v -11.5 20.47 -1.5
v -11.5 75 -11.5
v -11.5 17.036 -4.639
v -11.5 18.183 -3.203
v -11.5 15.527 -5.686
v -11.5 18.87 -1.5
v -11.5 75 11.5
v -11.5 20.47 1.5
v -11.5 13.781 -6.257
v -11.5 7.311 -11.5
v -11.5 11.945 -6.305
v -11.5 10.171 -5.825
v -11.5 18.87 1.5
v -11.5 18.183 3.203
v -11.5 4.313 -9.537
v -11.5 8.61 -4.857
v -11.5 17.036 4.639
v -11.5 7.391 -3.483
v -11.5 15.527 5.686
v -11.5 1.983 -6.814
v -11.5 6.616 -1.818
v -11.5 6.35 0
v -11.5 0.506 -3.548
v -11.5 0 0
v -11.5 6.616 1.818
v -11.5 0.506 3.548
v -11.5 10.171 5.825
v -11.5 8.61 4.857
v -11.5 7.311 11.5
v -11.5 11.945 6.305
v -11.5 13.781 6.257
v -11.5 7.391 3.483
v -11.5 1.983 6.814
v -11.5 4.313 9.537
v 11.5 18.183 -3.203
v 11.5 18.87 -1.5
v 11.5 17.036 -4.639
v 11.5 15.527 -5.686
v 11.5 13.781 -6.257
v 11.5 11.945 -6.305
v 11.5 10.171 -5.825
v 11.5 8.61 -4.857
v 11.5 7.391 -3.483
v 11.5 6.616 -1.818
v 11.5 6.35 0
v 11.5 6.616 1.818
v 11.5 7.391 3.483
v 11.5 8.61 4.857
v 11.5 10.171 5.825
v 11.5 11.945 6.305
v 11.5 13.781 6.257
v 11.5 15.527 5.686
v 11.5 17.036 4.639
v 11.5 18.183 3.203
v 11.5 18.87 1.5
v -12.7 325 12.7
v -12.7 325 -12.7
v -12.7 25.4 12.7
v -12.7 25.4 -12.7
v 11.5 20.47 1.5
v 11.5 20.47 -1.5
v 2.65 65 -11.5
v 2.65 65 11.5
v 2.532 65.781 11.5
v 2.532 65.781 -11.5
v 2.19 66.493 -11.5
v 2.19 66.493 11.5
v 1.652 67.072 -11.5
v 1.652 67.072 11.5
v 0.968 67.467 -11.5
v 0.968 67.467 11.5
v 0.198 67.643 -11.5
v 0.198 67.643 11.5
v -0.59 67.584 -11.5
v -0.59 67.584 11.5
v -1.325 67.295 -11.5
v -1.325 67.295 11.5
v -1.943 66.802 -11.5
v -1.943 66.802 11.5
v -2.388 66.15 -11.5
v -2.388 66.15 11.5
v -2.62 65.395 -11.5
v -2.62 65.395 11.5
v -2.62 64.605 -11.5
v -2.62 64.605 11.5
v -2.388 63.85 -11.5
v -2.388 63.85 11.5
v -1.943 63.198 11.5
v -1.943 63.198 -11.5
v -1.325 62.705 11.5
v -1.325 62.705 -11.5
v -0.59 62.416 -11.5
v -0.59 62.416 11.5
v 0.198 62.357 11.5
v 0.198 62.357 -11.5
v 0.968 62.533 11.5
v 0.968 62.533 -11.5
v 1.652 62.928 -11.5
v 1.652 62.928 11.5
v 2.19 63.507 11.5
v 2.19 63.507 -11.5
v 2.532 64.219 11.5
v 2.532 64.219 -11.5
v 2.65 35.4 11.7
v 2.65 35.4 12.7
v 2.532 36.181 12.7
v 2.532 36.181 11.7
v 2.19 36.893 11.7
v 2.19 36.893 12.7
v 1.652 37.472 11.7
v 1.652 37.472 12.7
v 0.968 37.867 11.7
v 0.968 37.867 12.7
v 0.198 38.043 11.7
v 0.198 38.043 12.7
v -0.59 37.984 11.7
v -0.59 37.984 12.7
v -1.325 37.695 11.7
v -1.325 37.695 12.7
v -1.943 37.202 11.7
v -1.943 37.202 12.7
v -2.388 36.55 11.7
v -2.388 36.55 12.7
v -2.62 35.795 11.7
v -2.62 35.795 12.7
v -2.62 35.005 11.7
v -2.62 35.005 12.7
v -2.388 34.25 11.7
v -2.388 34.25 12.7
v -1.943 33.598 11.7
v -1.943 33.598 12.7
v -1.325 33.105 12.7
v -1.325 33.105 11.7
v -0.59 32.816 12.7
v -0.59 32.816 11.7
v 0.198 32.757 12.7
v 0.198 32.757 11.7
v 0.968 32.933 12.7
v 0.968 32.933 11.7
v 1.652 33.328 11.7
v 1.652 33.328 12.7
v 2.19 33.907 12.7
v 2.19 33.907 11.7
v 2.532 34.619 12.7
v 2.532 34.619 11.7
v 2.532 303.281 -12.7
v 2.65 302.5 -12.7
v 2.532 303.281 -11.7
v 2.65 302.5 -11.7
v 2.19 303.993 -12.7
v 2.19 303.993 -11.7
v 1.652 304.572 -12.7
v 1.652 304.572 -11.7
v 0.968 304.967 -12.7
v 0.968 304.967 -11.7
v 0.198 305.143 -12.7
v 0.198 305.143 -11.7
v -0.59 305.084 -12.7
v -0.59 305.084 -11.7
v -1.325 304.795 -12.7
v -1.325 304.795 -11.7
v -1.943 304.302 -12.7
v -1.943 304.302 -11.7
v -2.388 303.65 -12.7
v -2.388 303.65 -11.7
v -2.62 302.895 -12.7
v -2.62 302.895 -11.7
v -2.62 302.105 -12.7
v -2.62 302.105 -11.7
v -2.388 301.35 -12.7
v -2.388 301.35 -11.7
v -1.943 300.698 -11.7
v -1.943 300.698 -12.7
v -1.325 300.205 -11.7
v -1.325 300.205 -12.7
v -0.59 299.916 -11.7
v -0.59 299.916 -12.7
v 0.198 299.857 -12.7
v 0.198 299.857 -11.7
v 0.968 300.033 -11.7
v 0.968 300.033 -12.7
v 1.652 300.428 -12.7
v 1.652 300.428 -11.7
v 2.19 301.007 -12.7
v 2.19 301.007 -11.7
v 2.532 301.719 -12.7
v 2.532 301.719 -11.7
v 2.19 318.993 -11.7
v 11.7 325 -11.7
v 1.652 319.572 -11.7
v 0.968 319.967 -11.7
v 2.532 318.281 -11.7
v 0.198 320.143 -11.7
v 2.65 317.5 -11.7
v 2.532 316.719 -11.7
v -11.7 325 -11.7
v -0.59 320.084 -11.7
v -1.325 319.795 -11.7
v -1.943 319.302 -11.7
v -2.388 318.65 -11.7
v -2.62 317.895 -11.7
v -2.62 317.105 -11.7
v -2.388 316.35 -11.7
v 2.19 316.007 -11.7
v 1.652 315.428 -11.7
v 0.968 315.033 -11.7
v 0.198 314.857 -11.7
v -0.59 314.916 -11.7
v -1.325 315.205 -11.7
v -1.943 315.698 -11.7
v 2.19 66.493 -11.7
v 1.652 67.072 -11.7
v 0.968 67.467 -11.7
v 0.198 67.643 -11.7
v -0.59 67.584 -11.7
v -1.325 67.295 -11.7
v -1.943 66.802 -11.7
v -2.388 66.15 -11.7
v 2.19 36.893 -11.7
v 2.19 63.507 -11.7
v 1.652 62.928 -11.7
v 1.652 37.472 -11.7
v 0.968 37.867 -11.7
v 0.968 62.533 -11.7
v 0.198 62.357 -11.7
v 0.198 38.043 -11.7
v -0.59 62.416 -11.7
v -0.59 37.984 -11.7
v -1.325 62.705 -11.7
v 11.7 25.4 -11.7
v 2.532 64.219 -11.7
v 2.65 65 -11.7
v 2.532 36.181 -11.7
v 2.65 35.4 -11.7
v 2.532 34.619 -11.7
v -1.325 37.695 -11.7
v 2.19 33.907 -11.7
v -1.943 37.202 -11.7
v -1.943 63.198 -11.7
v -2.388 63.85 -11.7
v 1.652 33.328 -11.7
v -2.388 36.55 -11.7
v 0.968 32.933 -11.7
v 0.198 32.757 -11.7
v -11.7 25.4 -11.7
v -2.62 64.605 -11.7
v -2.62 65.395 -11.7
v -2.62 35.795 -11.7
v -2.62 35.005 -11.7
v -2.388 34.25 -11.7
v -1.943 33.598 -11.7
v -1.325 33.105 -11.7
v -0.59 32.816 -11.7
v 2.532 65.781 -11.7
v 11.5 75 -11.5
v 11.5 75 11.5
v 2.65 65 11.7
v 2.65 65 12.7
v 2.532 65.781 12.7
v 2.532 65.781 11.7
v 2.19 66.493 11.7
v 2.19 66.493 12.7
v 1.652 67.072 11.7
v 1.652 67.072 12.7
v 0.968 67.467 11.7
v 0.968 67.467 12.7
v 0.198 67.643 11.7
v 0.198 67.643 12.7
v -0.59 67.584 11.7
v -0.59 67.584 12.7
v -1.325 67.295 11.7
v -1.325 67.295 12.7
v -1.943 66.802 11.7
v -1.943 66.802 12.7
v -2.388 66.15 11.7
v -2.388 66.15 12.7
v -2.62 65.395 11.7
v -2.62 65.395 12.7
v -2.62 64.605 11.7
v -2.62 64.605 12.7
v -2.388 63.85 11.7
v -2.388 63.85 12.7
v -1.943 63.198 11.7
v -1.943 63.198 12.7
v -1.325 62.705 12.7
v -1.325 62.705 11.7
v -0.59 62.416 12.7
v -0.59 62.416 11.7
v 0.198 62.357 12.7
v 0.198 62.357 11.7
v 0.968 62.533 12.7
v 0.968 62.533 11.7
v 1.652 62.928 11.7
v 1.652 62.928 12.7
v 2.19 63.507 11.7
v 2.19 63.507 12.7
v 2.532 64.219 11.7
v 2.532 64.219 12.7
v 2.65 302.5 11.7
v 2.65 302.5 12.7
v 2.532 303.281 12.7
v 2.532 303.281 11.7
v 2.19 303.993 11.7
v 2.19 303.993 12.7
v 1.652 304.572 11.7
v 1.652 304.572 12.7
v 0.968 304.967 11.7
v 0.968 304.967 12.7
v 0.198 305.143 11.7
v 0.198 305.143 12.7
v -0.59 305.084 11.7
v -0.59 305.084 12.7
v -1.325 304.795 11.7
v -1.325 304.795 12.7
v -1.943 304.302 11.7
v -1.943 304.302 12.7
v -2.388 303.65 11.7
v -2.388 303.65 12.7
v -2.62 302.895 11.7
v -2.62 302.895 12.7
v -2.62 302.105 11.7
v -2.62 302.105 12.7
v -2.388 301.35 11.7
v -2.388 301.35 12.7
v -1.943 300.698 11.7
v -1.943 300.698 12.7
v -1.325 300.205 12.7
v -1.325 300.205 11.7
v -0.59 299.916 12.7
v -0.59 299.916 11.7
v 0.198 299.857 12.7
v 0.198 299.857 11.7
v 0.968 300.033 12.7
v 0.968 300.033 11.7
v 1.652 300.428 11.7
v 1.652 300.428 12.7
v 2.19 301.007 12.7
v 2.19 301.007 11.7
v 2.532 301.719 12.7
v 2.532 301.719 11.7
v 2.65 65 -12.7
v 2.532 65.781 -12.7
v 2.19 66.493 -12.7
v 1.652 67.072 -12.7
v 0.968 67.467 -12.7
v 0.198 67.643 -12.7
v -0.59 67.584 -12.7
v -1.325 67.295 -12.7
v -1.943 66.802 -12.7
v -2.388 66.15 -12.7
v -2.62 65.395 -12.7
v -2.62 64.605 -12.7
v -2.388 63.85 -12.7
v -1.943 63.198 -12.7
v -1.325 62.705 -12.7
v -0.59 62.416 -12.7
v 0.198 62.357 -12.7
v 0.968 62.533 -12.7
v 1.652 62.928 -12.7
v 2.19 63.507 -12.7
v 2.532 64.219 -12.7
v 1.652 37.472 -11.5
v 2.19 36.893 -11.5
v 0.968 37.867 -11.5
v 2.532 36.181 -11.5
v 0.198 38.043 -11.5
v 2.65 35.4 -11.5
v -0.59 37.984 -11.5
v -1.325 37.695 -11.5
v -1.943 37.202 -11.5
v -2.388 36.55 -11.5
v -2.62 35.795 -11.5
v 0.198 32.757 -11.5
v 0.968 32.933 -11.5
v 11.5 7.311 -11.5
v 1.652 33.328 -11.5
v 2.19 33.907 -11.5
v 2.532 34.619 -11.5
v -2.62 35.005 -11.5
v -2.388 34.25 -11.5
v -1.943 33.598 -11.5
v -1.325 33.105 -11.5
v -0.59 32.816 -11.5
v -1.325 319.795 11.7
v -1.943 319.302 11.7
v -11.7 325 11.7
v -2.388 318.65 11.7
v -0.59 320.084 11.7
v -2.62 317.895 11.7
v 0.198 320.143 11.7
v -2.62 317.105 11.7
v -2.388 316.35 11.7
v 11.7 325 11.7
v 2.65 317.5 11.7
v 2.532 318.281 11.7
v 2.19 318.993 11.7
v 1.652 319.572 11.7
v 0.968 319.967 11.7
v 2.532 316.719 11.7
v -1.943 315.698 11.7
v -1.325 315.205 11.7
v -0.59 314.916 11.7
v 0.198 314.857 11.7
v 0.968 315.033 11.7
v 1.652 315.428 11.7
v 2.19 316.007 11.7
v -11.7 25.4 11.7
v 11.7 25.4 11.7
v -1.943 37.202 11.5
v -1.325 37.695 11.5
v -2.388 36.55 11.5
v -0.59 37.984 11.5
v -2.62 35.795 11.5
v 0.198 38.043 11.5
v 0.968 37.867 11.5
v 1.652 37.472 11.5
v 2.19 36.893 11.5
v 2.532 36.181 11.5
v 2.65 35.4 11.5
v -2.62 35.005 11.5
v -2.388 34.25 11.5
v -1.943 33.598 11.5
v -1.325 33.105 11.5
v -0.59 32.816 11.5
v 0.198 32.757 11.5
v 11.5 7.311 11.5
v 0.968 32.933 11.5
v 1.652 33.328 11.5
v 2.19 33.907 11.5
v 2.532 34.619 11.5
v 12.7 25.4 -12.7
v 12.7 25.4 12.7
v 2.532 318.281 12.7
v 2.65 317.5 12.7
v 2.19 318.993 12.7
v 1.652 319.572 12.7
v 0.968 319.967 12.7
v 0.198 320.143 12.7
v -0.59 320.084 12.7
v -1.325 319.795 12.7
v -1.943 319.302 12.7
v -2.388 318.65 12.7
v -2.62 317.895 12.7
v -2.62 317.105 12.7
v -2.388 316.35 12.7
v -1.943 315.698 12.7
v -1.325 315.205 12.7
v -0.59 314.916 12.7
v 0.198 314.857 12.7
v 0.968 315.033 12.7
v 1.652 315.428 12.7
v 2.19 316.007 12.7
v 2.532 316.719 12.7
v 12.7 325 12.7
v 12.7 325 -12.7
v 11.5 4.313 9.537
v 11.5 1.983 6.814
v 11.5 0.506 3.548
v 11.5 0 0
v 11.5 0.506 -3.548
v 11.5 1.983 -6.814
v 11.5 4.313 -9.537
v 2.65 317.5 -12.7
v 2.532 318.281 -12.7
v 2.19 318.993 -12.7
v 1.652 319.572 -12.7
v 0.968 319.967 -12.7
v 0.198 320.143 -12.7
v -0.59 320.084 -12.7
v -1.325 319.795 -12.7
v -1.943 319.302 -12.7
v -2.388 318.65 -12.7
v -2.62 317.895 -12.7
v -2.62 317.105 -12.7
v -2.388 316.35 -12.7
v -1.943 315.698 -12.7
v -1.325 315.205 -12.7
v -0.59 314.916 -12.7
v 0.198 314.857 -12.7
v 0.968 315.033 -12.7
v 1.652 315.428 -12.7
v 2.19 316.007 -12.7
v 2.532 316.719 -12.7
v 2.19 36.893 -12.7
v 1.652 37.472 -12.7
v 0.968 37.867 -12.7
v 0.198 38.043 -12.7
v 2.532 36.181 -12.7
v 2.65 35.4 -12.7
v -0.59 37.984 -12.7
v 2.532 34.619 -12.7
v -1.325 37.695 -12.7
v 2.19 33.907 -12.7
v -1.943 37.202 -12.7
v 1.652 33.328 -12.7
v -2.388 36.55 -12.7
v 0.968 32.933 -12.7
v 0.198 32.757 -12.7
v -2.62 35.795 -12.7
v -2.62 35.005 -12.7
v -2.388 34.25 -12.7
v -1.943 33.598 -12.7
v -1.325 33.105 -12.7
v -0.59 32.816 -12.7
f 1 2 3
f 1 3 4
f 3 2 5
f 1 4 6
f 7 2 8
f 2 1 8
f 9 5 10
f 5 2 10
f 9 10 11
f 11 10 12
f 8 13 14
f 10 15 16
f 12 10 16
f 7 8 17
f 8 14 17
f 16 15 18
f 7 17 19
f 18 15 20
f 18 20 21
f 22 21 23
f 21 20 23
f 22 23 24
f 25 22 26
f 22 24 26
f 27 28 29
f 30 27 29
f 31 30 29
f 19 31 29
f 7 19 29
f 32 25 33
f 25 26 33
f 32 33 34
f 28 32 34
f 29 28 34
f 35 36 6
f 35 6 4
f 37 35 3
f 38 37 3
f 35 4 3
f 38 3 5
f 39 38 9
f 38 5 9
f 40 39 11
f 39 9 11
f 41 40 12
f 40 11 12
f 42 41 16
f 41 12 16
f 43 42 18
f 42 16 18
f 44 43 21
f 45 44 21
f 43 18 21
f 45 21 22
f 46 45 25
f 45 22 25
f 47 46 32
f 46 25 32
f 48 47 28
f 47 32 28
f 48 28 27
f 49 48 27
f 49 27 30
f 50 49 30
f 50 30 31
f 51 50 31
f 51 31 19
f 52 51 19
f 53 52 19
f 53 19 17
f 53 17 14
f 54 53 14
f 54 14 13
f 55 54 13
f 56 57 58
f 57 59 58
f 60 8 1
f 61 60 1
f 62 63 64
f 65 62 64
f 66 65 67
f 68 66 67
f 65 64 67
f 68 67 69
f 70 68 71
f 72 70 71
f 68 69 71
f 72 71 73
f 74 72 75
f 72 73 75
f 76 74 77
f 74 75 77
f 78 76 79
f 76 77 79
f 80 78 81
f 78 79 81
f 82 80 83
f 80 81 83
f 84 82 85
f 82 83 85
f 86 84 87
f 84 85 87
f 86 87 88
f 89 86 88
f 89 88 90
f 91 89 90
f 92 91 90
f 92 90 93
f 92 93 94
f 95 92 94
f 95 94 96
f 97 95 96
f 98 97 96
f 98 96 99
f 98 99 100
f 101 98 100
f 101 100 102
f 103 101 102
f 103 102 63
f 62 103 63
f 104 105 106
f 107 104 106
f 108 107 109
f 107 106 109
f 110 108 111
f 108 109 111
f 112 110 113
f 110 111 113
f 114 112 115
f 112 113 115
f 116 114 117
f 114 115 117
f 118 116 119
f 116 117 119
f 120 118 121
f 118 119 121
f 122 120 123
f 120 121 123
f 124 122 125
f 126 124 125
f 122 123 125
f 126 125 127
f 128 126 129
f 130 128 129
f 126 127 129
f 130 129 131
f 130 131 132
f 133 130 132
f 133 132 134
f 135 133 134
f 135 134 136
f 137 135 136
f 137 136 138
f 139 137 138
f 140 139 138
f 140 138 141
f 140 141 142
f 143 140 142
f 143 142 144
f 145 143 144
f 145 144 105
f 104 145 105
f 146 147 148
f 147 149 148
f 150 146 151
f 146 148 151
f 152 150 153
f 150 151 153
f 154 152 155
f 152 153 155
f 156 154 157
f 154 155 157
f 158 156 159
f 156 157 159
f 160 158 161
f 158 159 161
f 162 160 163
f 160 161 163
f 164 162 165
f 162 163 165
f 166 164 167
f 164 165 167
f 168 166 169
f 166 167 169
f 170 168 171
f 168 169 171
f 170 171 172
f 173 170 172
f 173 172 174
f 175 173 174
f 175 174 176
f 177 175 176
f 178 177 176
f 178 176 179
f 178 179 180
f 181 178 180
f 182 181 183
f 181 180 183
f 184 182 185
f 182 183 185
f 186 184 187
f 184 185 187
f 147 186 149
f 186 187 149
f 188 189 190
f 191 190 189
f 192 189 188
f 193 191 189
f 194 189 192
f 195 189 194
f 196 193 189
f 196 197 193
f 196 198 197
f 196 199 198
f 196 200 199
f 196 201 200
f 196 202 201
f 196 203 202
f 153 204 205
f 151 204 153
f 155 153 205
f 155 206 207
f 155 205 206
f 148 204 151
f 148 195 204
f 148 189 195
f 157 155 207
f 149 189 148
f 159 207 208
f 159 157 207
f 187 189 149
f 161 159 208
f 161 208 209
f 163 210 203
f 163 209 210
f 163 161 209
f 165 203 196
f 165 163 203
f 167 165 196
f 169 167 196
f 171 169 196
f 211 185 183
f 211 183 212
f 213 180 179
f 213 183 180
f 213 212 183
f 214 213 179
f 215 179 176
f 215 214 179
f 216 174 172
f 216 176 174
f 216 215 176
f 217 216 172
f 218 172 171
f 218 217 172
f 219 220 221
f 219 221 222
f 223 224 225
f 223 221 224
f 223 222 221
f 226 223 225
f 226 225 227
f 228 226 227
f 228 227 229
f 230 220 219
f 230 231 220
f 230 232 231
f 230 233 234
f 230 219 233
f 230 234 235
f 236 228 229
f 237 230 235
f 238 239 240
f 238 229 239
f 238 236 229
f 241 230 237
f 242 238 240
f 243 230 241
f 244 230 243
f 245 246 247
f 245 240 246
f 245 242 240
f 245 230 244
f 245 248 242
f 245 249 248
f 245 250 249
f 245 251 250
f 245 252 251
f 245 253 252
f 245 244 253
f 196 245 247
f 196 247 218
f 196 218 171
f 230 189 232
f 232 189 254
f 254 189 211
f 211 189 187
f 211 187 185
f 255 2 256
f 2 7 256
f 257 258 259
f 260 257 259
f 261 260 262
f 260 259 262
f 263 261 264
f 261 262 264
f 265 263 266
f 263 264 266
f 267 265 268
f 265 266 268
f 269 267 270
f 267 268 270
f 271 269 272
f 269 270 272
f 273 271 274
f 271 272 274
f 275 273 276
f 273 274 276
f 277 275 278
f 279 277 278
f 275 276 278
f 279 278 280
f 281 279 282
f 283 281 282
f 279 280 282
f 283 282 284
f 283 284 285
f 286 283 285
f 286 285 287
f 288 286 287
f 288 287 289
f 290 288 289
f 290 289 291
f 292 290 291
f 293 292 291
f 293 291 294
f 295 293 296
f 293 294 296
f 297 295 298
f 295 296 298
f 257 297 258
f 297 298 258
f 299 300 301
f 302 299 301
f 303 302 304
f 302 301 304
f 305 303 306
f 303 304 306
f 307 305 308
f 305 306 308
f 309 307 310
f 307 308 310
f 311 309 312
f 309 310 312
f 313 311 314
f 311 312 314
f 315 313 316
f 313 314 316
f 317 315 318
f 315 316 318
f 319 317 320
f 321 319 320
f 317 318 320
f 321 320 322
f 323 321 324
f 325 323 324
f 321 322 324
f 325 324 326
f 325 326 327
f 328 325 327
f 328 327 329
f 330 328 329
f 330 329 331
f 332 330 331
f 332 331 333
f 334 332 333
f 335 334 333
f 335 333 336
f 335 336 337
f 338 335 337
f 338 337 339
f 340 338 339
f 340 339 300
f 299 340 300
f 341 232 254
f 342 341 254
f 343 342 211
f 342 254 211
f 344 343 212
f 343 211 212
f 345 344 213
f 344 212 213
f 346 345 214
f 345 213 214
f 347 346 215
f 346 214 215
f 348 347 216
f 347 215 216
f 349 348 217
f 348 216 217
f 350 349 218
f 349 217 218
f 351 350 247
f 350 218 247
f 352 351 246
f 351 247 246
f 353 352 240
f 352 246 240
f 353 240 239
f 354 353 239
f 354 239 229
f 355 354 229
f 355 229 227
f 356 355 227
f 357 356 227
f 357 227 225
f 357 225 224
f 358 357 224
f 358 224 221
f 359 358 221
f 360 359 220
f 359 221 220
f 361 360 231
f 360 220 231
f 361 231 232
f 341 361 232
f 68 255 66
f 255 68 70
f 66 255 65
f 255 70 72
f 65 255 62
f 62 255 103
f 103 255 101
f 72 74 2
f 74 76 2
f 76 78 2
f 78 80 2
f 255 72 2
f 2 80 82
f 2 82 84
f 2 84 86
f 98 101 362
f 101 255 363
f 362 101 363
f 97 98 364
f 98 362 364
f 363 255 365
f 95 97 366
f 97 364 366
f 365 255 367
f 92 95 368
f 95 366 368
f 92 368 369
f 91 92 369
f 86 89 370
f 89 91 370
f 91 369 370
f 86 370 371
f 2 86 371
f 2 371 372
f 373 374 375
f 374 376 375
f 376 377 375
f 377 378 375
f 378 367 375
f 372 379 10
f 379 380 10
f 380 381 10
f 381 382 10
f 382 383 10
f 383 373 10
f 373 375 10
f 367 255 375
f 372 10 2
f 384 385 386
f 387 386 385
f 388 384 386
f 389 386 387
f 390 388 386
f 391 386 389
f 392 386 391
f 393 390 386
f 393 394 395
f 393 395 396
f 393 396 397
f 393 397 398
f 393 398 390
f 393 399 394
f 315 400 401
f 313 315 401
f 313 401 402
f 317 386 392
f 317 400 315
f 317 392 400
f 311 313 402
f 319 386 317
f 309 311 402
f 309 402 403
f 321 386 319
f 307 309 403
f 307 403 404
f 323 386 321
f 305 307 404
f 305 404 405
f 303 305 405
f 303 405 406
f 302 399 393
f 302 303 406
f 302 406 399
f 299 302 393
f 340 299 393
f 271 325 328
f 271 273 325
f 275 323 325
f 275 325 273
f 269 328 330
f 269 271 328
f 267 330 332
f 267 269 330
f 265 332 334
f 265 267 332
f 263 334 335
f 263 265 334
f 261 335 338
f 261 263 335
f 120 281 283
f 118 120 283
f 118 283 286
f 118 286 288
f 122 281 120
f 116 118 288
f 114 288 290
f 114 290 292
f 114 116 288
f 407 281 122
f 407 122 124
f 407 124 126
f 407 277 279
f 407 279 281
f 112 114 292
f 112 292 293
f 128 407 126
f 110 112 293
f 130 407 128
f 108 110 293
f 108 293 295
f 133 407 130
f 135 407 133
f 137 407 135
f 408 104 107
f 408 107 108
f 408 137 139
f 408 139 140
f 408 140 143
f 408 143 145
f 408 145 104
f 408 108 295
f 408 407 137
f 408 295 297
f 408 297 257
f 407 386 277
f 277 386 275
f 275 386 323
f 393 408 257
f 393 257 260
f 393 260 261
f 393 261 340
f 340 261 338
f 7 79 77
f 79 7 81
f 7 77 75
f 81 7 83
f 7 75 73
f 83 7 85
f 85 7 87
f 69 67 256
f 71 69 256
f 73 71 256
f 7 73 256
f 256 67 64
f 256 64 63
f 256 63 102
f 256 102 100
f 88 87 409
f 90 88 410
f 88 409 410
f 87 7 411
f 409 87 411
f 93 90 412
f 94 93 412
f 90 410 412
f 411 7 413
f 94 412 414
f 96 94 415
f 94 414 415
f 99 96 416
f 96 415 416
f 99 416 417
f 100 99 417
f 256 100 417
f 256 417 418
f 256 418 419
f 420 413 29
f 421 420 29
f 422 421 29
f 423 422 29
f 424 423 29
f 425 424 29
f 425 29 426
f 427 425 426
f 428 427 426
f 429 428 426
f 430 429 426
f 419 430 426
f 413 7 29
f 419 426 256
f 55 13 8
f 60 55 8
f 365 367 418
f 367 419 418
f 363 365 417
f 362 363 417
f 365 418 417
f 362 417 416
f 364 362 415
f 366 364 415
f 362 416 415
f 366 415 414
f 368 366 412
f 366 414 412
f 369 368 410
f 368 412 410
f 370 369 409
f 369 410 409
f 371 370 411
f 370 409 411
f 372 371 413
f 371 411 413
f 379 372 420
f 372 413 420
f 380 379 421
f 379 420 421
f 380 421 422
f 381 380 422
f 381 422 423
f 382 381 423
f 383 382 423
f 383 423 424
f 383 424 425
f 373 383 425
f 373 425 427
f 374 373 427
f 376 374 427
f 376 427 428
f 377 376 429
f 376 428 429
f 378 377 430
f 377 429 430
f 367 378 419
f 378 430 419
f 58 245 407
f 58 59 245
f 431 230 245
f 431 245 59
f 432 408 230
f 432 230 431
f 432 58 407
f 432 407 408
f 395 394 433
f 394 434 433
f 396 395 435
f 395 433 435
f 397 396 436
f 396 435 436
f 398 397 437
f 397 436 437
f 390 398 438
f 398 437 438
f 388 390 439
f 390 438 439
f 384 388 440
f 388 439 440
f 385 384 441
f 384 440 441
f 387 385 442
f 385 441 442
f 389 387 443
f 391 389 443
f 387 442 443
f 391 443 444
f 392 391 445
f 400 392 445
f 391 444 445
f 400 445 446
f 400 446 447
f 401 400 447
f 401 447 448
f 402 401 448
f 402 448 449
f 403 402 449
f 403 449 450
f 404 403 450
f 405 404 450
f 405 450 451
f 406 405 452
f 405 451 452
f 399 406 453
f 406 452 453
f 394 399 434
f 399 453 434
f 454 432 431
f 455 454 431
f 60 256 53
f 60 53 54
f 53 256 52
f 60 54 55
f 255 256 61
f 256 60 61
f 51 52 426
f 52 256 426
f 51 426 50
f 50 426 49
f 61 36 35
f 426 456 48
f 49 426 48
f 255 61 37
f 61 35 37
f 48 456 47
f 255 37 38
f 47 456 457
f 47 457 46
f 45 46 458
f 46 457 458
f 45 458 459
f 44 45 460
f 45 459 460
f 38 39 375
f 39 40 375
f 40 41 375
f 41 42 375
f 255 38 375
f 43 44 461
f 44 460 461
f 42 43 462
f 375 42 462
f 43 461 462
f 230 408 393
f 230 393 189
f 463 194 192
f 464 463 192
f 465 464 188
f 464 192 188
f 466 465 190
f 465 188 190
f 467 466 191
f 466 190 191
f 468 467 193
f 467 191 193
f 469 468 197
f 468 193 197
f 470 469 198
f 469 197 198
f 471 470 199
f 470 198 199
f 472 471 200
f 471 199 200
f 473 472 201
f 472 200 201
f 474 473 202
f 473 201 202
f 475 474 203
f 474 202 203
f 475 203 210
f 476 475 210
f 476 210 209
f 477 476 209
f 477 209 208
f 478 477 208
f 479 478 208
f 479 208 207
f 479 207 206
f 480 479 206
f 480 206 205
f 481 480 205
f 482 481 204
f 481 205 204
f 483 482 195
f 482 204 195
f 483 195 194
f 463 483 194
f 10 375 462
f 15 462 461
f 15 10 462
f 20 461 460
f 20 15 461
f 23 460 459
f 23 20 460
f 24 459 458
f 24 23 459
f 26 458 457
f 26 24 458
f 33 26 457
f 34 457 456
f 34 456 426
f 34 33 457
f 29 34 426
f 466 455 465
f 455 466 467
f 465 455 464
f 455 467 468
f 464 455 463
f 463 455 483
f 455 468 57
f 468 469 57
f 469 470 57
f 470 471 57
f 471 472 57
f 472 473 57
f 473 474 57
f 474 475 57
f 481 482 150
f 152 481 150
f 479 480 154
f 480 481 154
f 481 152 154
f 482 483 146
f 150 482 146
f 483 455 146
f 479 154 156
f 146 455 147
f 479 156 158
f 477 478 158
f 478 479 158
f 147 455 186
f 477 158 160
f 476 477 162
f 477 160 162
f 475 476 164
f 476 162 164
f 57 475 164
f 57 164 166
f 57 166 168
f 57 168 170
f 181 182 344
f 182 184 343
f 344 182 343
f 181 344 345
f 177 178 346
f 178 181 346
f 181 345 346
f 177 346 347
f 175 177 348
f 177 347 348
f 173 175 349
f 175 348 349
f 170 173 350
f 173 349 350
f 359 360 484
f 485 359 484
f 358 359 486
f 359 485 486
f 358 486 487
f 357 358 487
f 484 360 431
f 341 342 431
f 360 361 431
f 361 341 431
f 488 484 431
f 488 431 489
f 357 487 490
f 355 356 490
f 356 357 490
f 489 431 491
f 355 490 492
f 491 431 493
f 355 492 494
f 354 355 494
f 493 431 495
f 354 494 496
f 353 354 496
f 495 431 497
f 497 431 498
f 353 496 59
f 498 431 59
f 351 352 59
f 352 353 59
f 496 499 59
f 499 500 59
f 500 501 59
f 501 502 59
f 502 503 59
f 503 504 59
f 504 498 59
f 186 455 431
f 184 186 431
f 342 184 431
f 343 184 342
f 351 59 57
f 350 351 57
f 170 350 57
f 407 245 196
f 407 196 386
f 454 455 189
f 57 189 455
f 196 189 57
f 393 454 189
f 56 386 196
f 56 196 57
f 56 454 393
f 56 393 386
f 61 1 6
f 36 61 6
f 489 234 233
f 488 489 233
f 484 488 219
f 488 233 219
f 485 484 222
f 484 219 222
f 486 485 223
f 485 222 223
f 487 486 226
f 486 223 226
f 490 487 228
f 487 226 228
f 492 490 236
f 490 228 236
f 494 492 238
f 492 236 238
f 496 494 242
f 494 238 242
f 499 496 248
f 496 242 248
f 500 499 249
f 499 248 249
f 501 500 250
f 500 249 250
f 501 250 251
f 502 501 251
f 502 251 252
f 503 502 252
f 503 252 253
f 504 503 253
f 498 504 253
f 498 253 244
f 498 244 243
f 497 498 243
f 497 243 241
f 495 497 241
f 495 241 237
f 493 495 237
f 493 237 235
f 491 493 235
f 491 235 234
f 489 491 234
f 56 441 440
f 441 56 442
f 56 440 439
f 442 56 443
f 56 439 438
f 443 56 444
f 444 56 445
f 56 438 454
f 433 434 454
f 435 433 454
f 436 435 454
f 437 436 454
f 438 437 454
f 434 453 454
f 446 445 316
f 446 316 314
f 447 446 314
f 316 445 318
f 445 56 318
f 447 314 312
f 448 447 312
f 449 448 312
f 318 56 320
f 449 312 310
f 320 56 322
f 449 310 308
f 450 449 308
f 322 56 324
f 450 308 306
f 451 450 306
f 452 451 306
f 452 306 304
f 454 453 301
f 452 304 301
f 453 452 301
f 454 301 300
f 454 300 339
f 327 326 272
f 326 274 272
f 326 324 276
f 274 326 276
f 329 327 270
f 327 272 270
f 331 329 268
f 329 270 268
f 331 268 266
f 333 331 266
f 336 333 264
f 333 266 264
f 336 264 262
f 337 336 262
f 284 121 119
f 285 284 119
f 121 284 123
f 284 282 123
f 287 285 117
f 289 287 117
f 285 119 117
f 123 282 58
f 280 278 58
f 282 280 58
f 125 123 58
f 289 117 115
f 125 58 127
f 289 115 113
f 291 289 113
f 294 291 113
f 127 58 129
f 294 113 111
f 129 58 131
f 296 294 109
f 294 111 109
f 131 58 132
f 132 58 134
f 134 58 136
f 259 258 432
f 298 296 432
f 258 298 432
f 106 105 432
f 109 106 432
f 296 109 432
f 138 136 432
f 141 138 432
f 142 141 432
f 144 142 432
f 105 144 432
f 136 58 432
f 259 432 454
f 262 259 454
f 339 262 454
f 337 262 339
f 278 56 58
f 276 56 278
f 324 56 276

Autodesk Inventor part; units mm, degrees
ref_plane "YZ Plane" through (0, 0, 0) normal (1, 0, 0) x (0, 1, 0)
ref_plane "XZ Plane" through (0, 0, 0) normal (0, 1, 0) x (-1, 0, 0)
sketch "Sketch1" plane through (0, 0, 0) normal (0, 1, 0) x (-1, 0, 0)
  line L0 (12.7, 12.7) -> (-12.7, 12.7)
  line L1 (-12.7, 12.7) -> (-12.7, -12.7)
  line L2 (-12.7, -12.7) -> (12.7, -12.7)
  line L3 (12.7, -12.7) -> (12.7, 12.7)
  line L4 (12.7, 12.7) -> (-12.7, -12.7) construction
  line L5 (-12.7, 12.7) -> (12.7, -12.7) construction
  line L6 (-11.7, -11.7) -> (11.7, -11.7)
  line L7 (11.7, -11.7) -> (11.7, 11.7)
  line L8 (11.7, 11.7) -> (-11.7, 11.7)
  line L9 (-11.7, 11.7) -> (-11.7, -11.7)
  line L10 (-11.7, -11.7) -> (11.7, 11.7) construction
  line L11 (11.7, -11.7) -> (-11.7, 11.7) construction
  point P0 (0, 0)
  dimension "d0" = 25.4
  dimension "d1" = 1
extrude "Extrusion1" add sketch "Sketch1" along normal blind 325
ref_plane "Work Plane1" through (-12.7, 325, 12.7) normal (0, 0.7504, 0.661) x (1, 0, 0)
sketch "Sketch4" plane through (0, 0, 0) normal (0, -1, 0) x (1, 0, 0)
  line L0 (11.5, -11.5) -> (-11.5, -11.5)
  line L1 (-11.5, -11.5) -> (-11.5, 11.5)
  line L2 (-11.5, 11.5) -> (11.5, 11.5)
  line L3 (11.5, 11.5) -> (11.5, -11.5)
  line L4 (11.5, -11.5) -> (-11.5, 11.5) construction
  line L5 (-11.5, -11.5) -> (11.5, 11.5) construction
  line L6 (11.7, 11.7) -> (-11.7, 11.7) projected
  point P0 (0, 0)
  dimension "d9" = 0.2
extrude "Extrusion3" add sketch "Sketch4" against normal blind 75 separate body
sketch "Sketch6" plane through (0, 0, 0) normal (0, -1, 0) x (1, 0, 0)
  line L0 (12.7, 12.7) -> (12.7, -12.7) projected
  line L1 (-12.7, 12.7) -> (12.7, 12.7) projected
  line L2 (-12.7, -12.7) -> (-12.7, 12.7) projected
  line L3 (12.7, -12.7) -> (-12.7, -12.7) projected
  line L4 (11.7, -11.7) -> (11.7, 11.7) projected
  line L5 (-11.7, -11.7) -> (11.7, -11.7) projected
  line L6 (-11.7, 11.7) -> (-11.7, -11.7) projected
  line L7 (11.7, 11.7) -> (-11.7, 11.7) projected
  point P0 (0, 0)
extrude "Extrusion5" cut sketch "Sketch6" against normal blind 25.4 bodies 1
sketch "Sketch5" plane through (-12.7, 0, -12.7) normal (-1, 0, 0) x (0, 0, 1)
  circle A0 centre (12.7, 12.7) radius 12.7
  line L0 (25.4, 0) -> (25.4, 325) projected
  line L1 (0, 0) -> (25.4, 0) projected
  line L2 (0, 0) -> (0, 325) projected
  circle A1 centre (12.7, 12.7) radius 6.35
  line L3 (14.2, 20.4703) -> (11.2, 20.4703)
  line L4 (11.2, 20.4703) -> (11.2, 17.4703)
  line L5 (11.2, 17.4703) -> (14.2, 17.4703)
  line L6 (14.2, 17.4703) -> (14.2, 20.4703)
  line L7 (12.7, 17.4703) -> (12.7, 19.05) construction
  point P0 (12.7, 0)
  point P1 (17.3368, 8.3615)
  point P2 (0, 12.7)
  point P3 (12.7, 0)
  point P4 (25.4, 12.7)
  point P5 (14.2, 18.8703)
  point P6 (11.2, 18.8703)
  dimension "d32" = 1.4
  dimension "d33" = 3
  dimension "d34" = 12.7
extrude "Extrusion4" cut sketch "Sketch5" against normal through all contours L0 L1 A0 | A0 L1 L2 | A1 L4 L5 L6 | L6 L5 L4 A1 | A1 L4 L3 L6 bodies 1 2
sketch "Sketch7" plane through (-12.7, 325, 12.7) normal (0, 0, 1) x (1, 0, 0)
  line L0 (12.7, -289.6) -> (12.7, -260) construction
  line L1 (12.7, -260) -> (12.7, -250) construction
  line L2 (12.7, -289.6) -> (12.7, -299.6) construction
  circle A0 centre (12.7, -260) radius 2.65
  circle A1 centre (12.7, -289.6) radius 2.65
  line L3 (1.2, -250) -> (24.2, -250) projected
  line L4 (0, -299.6) -> (25.4, -299.6) projected
  dimension "d20" = 5.3
  dimension "d21" = 10
extrude "Extrusion6" cut sketch "Sketch7" against normal through all bodies 1 2
sketch "Sketch8" plane through (-12.7, 325, 12.7) normal (0, 0, 1) x (1, 0, 0)
  line L0 (25.4, 0) -> (0, 0) projected
  line L1 (25.4, -299.6) -> (25.4, 0) projected
  line L2 (0, -299.6) -> (0, 0) projected
  line L3 (12.7, 0) -> (12.7, -7.5) construction
  line L4 (12.7, -7.5) -> (12.7, -22.5) construction
  circle A0 centre (12.7, -7.5) radius 2.65
  circle A1 centre (12.7, -22.5) radius 2.65
  point P0 (12.7, -325)
  dimension "d26" = 7.5
  dimension "d27" = 15
  dimension "d28" = 5.3
  dimension "d29" = 5.3
extrude "Extrusion7" cut sketch "Sketch8" against normal through all bodies 1
properties part number "Brazo" material "Aluminum 6061"
